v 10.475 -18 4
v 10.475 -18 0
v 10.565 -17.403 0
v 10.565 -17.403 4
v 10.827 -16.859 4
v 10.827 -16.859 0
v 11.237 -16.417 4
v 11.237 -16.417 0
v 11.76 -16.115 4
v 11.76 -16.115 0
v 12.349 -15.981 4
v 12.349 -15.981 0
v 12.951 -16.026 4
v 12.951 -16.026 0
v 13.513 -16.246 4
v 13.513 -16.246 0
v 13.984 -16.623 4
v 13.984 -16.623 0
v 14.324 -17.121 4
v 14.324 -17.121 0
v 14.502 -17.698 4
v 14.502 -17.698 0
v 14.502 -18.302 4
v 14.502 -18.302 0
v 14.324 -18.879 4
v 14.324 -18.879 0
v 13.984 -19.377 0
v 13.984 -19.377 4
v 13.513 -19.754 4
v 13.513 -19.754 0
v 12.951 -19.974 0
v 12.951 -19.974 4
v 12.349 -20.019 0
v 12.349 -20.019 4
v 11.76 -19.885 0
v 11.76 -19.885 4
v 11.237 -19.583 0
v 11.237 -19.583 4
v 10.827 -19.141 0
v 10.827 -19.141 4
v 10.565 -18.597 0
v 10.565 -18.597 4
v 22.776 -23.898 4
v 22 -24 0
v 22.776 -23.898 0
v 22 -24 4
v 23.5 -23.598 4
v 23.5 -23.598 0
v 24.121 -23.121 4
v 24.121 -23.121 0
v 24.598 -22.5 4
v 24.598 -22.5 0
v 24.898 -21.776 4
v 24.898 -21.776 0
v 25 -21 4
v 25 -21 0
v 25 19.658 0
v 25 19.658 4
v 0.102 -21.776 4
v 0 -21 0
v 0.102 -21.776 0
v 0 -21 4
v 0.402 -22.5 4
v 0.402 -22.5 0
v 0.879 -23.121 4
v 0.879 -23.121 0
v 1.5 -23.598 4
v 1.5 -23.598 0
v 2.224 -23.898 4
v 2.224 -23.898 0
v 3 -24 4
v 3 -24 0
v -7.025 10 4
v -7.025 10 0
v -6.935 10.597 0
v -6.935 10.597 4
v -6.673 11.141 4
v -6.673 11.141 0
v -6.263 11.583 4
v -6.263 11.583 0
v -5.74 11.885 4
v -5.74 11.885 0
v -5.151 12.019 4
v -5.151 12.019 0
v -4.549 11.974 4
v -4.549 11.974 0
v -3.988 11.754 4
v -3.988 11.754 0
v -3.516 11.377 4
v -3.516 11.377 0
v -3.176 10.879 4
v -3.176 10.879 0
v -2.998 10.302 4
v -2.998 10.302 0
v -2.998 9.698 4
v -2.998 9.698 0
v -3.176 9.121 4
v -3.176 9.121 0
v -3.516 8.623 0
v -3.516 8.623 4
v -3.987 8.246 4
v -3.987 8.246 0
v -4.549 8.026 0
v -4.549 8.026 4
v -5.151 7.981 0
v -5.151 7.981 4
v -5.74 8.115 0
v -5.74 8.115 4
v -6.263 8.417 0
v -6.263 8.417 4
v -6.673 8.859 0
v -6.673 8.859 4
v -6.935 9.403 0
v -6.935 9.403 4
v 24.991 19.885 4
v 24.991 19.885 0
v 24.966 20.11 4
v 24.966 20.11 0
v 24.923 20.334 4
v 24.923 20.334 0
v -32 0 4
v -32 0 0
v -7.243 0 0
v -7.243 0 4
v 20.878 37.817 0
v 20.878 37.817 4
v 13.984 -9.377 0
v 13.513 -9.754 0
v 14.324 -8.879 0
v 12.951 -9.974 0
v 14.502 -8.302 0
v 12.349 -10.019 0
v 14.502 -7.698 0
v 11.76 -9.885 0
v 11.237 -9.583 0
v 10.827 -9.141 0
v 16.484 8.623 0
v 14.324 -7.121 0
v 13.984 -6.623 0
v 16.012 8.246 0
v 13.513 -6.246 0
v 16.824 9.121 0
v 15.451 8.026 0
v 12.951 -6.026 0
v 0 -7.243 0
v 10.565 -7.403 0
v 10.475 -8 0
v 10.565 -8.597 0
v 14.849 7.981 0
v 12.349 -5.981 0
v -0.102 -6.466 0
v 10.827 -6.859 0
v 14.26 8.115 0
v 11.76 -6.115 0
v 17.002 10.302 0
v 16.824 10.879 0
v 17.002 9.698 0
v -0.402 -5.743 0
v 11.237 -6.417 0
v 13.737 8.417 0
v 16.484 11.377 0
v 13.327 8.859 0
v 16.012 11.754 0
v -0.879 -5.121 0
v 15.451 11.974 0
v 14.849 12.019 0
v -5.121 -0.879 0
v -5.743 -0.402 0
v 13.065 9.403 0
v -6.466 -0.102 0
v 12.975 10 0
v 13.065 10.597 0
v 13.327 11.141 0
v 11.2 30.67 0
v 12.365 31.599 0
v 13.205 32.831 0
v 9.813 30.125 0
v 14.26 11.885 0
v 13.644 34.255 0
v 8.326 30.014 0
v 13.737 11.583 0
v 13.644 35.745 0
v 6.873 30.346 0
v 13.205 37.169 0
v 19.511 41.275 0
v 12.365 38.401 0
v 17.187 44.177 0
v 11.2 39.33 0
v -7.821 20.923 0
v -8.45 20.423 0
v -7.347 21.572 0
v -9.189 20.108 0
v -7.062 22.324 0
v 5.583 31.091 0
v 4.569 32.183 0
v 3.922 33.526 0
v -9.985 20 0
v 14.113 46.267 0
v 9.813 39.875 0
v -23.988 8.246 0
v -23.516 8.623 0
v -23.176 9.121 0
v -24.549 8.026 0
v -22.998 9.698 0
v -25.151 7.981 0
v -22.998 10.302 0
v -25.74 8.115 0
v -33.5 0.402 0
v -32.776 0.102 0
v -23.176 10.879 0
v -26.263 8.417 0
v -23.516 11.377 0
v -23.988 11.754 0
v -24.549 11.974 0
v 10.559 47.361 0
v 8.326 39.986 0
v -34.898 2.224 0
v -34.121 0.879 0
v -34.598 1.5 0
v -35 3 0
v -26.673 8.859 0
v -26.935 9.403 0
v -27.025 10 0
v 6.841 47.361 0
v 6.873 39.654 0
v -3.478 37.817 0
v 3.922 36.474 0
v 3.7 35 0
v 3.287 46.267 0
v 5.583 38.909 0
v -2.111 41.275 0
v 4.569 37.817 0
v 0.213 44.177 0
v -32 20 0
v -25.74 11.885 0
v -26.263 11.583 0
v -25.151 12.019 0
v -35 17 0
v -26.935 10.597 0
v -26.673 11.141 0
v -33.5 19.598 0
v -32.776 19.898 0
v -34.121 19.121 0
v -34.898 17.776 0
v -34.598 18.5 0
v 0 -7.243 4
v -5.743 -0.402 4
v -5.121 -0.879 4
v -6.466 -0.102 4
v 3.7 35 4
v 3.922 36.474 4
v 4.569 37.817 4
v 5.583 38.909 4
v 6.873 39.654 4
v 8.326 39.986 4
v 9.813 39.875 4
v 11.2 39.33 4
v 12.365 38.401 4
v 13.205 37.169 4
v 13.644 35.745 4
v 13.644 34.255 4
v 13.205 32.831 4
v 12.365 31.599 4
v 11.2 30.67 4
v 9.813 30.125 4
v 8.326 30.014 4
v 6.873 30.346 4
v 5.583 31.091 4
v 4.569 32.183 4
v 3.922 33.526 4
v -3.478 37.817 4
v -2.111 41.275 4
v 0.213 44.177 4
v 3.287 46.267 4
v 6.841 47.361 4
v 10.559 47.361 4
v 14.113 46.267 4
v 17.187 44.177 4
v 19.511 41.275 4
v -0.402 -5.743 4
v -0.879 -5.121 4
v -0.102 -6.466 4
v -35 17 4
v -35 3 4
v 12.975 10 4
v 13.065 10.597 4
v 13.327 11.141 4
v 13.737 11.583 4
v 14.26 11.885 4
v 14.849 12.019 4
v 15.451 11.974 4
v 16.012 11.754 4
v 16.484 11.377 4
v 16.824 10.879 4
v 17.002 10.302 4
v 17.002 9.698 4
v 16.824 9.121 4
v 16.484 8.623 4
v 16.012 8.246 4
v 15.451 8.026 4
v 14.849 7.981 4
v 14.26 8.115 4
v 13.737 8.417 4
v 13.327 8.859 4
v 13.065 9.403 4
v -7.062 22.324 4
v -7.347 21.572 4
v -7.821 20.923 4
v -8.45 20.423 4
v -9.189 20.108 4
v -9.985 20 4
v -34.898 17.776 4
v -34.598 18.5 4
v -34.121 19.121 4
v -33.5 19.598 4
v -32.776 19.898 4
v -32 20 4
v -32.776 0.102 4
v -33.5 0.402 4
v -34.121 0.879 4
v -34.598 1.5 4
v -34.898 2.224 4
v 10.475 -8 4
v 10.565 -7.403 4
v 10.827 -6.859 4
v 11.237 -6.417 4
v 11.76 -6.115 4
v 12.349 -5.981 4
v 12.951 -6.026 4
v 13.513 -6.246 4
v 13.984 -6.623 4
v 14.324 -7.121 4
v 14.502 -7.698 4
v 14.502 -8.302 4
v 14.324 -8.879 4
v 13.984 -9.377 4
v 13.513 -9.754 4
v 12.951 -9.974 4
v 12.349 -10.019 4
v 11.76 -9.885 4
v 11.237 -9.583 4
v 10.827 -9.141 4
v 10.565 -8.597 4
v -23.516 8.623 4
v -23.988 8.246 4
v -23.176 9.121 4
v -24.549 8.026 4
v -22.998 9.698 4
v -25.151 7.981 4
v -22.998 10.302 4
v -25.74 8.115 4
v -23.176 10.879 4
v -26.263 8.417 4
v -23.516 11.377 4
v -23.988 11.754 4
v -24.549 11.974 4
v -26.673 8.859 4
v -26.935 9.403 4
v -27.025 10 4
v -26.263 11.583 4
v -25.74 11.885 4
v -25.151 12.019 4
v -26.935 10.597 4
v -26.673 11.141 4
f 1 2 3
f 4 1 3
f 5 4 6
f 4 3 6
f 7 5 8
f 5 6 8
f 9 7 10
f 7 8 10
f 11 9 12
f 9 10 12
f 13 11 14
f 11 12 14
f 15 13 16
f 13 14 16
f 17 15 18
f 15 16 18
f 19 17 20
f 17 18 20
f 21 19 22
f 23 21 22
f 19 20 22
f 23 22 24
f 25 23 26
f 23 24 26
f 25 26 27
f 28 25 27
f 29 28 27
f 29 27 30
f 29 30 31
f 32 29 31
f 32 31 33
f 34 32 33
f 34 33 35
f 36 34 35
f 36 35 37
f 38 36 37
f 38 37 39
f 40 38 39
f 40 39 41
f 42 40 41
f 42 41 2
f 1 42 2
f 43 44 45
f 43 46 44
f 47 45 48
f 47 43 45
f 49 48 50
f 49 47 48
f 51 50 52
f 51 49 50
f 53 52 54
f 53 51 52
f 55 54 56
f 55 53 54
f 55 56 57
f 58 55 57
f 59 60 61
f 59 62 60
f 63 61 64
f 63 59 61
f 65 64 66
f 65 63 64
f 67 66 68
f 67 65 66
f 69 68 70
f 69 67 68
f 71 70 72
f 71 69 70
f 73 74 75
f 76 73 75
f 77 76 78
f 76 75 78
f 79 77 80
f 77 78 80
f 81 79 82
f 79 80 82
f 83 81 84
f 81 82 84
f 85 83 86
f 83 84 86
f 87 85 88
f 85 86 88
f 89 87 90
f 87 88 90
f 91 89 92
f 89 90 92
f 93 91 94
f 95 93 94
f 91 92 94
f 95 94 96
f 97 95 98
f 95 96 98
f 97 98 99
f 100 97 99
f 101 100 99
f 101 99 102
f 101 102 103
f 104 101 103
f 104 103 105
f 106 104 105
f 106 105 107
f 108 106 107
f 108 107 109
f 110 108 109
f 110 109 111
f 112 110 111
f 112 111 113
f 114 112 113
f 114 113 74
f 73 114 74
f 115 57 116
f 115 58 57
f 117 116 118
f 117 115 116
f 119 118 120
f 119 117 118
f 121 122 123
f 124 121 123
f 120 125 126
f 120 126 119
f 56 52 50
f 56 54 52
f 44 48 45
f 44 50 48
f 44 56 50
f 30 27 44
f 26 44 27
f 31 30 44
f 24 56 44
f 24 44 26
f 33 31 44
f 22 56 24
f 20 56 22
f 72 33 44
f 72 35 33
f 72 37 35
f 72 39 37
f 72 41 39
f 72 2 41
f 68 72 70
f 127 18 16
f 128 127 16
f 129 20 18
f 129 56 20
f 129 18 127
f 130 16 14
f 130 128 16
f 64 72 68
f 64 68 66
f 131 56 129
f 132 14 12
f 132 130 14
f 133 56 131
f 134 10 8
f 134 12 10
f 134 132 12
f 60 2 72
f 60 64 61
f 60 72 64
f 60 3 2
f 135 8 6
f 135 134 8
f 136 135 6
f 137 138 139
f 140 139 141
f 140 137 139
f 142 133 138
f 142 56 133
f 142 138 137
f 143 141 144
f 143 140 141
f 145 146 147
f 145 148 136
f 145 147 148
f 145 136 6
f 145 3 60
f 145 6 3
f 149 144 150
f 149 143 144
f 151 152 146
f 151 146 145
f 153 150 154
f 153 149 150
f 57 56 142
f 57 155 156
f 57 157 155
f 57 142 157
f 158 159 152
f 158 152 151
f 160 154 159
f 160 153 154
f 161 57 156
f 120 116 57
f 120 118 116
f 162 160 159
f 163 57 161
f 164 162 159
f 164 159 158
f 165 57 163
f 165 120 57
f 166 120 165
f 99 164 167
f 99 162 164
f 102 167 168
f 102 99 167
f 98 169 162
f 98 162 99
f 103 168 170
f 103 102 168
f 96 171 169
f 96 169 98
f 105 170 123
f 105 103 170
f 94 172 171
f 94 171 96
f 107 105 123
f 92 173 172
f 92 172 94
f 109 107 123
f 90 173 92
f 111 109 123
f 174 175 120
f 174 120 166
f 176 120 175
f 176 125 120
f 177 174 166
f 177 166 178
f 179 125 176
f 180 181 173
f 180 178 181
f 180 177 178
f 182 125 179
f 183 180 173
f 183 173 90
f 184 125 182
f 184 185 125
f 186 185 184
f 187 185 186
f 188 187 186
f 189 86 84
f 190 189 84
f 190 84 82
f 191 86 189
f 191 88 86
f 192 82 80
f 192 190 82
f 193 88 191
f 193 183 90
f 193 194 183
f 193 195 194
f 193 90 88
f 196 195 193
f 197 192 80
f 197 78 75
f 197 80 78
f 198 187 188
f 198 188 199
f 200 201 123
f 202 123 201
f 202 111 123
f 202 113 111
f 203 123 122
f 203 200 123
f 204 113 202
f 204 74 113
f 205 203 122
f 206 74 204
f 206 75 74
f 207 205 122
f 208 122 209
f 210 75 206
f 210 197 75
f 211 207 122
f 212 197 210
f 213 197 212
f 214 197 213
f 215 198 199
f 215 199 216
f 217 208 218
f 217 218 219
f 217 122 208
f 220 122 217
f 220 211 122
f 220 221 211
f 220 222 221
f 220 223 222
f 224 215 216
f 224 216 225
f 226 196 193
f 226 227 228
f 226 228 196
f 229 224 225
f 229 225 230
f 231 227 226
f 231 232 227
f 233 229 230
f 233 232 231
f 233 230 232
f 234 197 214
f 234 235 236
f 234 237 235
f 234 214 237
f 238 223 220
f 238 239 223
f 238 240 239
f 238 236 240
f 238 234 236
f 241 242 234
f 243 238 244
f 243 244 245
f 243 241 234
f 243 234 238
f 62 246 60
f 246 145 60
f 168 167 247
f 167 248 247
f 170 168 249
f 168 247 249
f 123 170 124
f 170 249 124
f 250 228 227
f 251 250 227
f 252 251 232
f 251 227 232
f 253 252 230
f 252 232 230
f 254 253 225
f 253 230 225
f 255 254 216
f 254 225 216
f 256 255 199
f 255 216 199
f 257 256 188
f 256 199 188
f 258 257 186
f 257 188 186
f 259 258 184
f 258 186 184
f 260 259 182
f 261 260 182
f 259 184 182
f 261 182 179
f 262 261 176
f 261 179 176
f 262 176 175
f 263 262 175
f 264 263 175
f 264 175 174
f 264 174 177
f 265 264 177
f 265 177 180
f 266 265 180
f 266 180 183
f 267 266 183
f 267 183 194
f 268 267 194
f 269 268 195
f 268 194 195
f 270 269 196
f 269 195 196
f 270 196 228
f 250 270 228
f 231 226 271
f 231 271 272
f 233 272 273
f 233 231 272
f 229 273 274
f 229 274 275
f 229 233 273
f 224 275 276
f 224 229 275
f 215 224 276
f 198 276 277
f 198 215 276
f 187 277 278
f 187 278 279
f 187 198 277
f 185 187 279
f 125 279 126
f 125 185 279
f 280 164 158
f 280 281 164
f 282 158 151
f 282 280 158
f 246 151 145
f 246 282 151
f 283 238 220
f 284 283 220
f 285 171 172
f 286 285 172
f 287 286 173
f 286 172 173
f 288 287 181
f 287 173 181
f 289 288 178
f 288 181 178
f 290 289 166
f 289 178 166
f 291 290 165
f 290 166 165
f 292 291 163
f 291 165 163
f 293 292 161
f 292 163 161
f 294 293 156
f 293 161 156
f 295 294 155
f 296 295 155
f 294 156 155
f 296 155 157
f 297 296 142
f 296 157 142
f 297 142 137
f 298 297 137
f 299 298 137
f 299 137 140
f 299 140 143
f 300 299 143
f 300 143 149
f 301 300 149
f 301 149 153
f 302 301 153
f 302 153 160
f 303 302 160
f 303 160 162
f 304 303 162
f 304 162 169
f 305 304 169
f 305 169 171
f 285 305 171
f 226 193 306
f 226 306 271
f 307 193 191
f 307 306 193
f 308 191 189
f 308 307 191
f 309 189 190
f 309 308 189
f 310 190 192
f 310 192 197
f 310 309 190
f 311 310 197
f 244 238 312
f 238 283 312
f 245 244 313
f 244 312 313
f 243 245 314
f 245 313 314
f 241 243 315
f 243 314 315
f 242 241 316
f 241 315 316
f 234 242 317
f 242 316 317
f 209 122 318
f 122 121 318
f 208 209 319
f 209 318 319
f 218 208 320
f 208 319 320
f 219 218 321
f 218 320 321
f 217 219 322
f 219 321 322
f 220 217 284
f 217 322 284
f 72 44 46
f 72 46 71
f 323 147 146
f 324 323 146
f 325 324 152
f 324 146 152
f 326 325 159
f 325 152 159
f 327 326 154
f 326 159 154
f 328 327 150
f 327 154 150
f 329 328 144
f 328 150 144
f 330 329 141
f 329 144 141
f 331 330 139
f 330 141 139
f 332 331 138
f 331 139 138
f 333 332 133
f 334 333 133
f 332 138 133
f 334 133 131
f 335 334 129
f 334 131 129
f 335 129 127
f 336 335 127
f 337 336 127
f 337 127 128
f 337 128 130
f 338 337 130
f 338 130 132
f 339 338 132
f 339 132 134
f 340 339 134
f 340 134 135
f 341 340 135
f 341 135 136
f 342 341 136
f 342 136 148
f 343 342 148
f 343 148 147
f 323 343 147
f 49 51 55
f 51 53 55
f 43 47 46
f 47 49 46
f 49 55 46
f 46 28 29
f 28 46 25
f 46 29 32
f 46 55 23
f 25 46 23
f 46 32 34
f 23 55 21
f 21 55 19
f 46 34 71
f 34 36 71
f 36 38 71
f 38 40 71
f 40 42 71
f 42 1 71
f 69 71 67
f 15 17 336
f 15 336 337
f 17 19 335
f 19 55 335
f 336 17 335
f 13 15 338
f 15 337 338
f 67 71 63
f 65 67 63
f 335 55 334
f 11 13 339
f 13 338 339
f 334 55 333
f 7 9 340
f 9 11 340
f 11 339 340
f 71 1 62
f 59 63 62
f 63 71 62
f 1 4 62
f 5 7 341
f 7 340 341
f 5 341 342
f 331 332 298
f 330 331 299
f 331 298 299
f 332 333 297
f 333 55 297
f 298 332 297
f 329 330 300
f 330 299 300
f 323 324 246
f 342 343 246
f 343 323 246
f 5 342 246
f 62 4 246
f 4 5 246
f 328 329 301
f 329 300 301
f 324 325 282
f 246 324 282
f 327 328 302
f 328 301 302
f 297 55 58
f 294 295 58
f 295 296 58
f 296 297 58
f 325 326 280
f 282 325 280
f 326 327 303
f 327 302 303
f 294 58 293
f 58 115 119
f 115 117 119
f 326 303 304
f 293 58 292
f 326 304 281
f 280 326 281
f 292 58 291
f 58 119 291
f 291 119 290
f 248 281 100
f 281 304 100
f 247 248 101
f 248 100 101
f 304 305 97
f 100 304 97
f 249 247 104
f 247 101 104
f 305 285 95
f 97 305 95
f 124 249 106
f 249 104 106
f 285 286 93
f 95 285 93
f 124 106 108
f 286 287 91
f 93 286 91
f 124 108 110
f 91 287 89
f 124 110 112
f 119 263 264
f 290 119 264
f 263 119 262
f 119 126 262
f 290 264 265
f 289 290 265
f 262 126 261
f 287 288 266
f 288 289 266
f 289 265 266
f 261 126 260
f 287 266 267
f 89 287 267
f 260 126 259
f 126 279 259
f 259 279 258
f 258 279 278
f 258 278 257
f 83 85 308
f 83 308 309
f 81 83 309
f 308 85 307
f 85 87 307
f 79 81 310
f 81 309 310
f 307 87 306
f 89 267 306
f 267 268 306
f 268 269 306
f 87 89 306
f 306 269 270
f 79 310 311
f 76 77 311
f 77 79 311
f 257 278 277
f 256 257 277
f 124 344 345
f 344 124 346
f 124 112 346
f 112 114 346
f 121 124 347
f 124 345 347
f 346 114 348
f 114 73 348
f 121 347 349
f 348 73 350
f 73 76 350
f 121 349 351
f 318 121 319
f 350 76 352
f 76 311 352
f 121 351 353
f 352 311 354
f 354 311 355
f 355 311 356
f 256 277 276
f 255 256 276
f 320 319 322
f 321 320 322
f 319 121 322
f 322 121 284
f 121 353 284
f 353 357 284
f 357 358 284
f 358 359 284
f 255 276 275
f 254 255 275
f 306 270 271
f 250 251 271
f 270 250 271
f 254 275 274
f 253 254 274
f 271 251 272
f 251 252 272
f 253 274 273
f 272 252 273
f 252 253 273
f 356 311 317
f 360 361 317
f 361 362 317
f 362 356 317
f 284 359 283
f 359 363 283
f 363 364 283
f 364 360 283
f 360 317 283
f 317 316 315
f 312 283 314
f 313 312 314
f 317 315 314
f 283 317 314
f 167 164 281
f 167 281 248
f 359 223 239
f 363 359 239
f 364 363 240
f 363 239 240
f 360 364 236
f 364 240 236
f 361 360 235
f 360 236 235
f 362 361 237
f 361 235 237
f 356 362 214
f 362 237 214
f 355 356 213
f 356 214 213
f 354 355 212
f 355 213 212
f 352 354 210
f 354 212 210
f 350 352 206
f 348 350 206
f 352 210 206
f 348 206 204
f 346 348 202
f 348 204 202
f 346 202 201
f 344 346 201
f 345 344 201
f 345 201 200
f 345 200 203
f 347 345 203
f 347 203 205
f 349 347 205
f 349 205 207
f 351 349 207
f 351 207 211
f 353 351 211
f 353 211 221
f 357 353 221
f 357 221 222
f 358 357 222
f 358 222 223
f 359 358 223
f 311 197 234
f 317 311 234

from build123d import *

# Parameters (mm, degrees)
EXTRUDE_1_DEPTH          = 4
EXTRUDE_2_DEPTH          = 4
SKETCH_3_R               = 5
CUT_EXTRUDE_1_DEPTH      = 4
SKETCH_6_W               = 25
SKETCH_6_H               = 6
CUT_EXTRUDE_4_DEPTH      = 1
CUT_EXTRUDE_4_DEPTH_BACK = 5
SKETCH_7_R               = 2.025
CUT_EXTRUDE_5_DEPTH      = 1
CUT_EXTRUDE_5_DEPTH_BACK = 5
SKETCH_9_R               = 5
EXTRUDE_3_DEPTH          = 4
SKETCH_12_R              = 2.025
CUT_EXTRUDE_8_DEPTH      = 1
CUT_EXTRUDE_8_DEPTH_BACK = 5
EXTRUDE_4_DEPTH          = 4
FILLET_1_R               = 3


with BuildPart() as part:
    # 草图1 → 凸台-拉伸1 (new body)
    with BuildSketch(Plane.XY):
        Polygon((-35, 0), (0, 0), (0, -30), (25, -30), (25, 20), (-35, 20), align=None)
    extrude(amount=EXTRUDE_1_DEPTH)

    # 草图2 → 凸台-拉伸2 (add)
    with BuildSketch(Plane(origin=(0, 0, 0), x_dir=(-1, 0, 0), z_dir=(0, 0, -1))):
        with BuildLine():
            Line((-15.347247215, 38.473341973), (-25, 20))
            Line((-25, 20), (7.6, 20))
            Line((7.6, 20), (-2.052752785, 38.473341973))
            ThreePointArc((-2.052752785, 38.473341973), (-8.7, 42.5), (-15.347247215, 38.473341973))
        make_face()
    extrude(amount=-EXTRUDE_2_DEPTH)

    # 草图3 → 切除-拉伸1 (cut)
    with BuildSketch(Plane(origin=(0, 0, 0), x_dir=(-1, 0, 0), z_dir=(0, 0, -1))):
        with Locations((-8.7, 35)):
            Circle(SKETCH_3_R)
    extrude(amount=-CUT_EXTRUDE_1_DEPTH, mode=Mode.SUBTRACT)

    # 草图6 → 切除-拉伸4 (cut, two sides)
    with BuildSketch(Plane(origin=(0, 0, 0), x_dir=(-1, 0, 0), z_dir=(0, 0, -1))) as cut_extrude_4_sk:
        with Locations((-12.5, -27)):
            Rectangle(SKETCH_6_W, SKETCH_6_H)
    extrude(amount=CUT_EXTRUDE_4_DEPTH, mode=Mode.SUBTRACT)
    extrude(cut_extrude_4_sk.sketch, amount=-CUT_EXTRUDE_4_DEPTH_BACK, mode=Mode.SUBTRACT)

    # 草图7 → 切除-拉伸5 (cut, two sides)
    with BuildSketch(Plane(origin=(0, 0, 0), x_dir=(-1, 0, 0), z_dir=(0, 0, -1))) as cut_extrude_5_sk:
        with Locations((-12.5, -8)):
            Circle(SKETCH_7_R)
        with Locations((-12.5, -18)):
            Circle(SKETCH_7_R)
    extrude(amount=CUT_EXTRUDE_5_DEPTH, mode=Mode.SUBTRACT)
    extrude(cut_extrude_5_sk.sketch, amount=-CUT_EXTRUDE_5_DEPTH_BACK, mode=Mode.SUBTRACT)

    # 草图9 → 凸台-拉伸3 (add)
    with BuildSketch(Plane(origin=(0, 0, 0), x_dir=(-1, 0, 0), z_dir=(0, 0, -1))):
        with BuildLine():
            Line((-20.878399595, 37.817194226), (-25, 20))
            Line((-25, 20), (7.6, 20))
            Line((7.6, 20), (3.478399595, 37.817194226))
            ThreePointArc((3.478399595, 37.817194226), (-8.7, 47.5), (-20.878399595, 37.817194226))
        make_face()
        with Locations((-8.7, 35)):
            Circle(SKETCH_9_R, mode=Mode.SUBTRACT)
    extrude(amount=-EXTRUDE_3_DEPTH)

    # 草图12 → 切除-拉伸8 (cut, two sides)
    with BuildSketch(Plane(origin=(0, 0, 0), x_dir=(-1, 0, 0), z_dir=(0, 0, -1))) as cut_extrude_8_sk:
        with Locations((-15, 10)):
            Circle(SKETCH_12_R)
        with Locations((5, 10)):
            Circle(SKETCH_12_R)
        with Locations((25, 10)):
            Circle(SKETCH_12_R)
    extrude(amount=CUT_EXTRUDE_8_DEPTH, mode=Mode.SUBTRACT)
    extrude(cut_extrude_8_sk.sketch, amount=-CUT_EXTRUDE_8_DEPTH_BACK, mode=Mode.SUBTRACT)

    # 草图13 → 凸台-拉伸4 (add)
    with BuildSketch(Plane(origin=(0, 0, 0), x_dir=(-1, 0, 0), z_dir=(0, 0, -1))):
        Polygon((0, -6), (6, 0), (0, 0), align=None)
    extrude(amount=-EXTRUDE_4_DEPTH)

    # 圆角1
    fillet_1_edges = [part.edges().sort_by_distance(p)[0] for p in [
        (-6, 0, 2),
        (0, -6, 2),
        (-35, 20, 2),
        (25, 20, 2),
        (-35, 0, 2),
        (-7.6, 20, 2),
        (25, -24, 2),
        (0, -24, 2),
    ]]
    fillet(fillet_1_edges, radius=FILLET_1_R)


solid = part.part
